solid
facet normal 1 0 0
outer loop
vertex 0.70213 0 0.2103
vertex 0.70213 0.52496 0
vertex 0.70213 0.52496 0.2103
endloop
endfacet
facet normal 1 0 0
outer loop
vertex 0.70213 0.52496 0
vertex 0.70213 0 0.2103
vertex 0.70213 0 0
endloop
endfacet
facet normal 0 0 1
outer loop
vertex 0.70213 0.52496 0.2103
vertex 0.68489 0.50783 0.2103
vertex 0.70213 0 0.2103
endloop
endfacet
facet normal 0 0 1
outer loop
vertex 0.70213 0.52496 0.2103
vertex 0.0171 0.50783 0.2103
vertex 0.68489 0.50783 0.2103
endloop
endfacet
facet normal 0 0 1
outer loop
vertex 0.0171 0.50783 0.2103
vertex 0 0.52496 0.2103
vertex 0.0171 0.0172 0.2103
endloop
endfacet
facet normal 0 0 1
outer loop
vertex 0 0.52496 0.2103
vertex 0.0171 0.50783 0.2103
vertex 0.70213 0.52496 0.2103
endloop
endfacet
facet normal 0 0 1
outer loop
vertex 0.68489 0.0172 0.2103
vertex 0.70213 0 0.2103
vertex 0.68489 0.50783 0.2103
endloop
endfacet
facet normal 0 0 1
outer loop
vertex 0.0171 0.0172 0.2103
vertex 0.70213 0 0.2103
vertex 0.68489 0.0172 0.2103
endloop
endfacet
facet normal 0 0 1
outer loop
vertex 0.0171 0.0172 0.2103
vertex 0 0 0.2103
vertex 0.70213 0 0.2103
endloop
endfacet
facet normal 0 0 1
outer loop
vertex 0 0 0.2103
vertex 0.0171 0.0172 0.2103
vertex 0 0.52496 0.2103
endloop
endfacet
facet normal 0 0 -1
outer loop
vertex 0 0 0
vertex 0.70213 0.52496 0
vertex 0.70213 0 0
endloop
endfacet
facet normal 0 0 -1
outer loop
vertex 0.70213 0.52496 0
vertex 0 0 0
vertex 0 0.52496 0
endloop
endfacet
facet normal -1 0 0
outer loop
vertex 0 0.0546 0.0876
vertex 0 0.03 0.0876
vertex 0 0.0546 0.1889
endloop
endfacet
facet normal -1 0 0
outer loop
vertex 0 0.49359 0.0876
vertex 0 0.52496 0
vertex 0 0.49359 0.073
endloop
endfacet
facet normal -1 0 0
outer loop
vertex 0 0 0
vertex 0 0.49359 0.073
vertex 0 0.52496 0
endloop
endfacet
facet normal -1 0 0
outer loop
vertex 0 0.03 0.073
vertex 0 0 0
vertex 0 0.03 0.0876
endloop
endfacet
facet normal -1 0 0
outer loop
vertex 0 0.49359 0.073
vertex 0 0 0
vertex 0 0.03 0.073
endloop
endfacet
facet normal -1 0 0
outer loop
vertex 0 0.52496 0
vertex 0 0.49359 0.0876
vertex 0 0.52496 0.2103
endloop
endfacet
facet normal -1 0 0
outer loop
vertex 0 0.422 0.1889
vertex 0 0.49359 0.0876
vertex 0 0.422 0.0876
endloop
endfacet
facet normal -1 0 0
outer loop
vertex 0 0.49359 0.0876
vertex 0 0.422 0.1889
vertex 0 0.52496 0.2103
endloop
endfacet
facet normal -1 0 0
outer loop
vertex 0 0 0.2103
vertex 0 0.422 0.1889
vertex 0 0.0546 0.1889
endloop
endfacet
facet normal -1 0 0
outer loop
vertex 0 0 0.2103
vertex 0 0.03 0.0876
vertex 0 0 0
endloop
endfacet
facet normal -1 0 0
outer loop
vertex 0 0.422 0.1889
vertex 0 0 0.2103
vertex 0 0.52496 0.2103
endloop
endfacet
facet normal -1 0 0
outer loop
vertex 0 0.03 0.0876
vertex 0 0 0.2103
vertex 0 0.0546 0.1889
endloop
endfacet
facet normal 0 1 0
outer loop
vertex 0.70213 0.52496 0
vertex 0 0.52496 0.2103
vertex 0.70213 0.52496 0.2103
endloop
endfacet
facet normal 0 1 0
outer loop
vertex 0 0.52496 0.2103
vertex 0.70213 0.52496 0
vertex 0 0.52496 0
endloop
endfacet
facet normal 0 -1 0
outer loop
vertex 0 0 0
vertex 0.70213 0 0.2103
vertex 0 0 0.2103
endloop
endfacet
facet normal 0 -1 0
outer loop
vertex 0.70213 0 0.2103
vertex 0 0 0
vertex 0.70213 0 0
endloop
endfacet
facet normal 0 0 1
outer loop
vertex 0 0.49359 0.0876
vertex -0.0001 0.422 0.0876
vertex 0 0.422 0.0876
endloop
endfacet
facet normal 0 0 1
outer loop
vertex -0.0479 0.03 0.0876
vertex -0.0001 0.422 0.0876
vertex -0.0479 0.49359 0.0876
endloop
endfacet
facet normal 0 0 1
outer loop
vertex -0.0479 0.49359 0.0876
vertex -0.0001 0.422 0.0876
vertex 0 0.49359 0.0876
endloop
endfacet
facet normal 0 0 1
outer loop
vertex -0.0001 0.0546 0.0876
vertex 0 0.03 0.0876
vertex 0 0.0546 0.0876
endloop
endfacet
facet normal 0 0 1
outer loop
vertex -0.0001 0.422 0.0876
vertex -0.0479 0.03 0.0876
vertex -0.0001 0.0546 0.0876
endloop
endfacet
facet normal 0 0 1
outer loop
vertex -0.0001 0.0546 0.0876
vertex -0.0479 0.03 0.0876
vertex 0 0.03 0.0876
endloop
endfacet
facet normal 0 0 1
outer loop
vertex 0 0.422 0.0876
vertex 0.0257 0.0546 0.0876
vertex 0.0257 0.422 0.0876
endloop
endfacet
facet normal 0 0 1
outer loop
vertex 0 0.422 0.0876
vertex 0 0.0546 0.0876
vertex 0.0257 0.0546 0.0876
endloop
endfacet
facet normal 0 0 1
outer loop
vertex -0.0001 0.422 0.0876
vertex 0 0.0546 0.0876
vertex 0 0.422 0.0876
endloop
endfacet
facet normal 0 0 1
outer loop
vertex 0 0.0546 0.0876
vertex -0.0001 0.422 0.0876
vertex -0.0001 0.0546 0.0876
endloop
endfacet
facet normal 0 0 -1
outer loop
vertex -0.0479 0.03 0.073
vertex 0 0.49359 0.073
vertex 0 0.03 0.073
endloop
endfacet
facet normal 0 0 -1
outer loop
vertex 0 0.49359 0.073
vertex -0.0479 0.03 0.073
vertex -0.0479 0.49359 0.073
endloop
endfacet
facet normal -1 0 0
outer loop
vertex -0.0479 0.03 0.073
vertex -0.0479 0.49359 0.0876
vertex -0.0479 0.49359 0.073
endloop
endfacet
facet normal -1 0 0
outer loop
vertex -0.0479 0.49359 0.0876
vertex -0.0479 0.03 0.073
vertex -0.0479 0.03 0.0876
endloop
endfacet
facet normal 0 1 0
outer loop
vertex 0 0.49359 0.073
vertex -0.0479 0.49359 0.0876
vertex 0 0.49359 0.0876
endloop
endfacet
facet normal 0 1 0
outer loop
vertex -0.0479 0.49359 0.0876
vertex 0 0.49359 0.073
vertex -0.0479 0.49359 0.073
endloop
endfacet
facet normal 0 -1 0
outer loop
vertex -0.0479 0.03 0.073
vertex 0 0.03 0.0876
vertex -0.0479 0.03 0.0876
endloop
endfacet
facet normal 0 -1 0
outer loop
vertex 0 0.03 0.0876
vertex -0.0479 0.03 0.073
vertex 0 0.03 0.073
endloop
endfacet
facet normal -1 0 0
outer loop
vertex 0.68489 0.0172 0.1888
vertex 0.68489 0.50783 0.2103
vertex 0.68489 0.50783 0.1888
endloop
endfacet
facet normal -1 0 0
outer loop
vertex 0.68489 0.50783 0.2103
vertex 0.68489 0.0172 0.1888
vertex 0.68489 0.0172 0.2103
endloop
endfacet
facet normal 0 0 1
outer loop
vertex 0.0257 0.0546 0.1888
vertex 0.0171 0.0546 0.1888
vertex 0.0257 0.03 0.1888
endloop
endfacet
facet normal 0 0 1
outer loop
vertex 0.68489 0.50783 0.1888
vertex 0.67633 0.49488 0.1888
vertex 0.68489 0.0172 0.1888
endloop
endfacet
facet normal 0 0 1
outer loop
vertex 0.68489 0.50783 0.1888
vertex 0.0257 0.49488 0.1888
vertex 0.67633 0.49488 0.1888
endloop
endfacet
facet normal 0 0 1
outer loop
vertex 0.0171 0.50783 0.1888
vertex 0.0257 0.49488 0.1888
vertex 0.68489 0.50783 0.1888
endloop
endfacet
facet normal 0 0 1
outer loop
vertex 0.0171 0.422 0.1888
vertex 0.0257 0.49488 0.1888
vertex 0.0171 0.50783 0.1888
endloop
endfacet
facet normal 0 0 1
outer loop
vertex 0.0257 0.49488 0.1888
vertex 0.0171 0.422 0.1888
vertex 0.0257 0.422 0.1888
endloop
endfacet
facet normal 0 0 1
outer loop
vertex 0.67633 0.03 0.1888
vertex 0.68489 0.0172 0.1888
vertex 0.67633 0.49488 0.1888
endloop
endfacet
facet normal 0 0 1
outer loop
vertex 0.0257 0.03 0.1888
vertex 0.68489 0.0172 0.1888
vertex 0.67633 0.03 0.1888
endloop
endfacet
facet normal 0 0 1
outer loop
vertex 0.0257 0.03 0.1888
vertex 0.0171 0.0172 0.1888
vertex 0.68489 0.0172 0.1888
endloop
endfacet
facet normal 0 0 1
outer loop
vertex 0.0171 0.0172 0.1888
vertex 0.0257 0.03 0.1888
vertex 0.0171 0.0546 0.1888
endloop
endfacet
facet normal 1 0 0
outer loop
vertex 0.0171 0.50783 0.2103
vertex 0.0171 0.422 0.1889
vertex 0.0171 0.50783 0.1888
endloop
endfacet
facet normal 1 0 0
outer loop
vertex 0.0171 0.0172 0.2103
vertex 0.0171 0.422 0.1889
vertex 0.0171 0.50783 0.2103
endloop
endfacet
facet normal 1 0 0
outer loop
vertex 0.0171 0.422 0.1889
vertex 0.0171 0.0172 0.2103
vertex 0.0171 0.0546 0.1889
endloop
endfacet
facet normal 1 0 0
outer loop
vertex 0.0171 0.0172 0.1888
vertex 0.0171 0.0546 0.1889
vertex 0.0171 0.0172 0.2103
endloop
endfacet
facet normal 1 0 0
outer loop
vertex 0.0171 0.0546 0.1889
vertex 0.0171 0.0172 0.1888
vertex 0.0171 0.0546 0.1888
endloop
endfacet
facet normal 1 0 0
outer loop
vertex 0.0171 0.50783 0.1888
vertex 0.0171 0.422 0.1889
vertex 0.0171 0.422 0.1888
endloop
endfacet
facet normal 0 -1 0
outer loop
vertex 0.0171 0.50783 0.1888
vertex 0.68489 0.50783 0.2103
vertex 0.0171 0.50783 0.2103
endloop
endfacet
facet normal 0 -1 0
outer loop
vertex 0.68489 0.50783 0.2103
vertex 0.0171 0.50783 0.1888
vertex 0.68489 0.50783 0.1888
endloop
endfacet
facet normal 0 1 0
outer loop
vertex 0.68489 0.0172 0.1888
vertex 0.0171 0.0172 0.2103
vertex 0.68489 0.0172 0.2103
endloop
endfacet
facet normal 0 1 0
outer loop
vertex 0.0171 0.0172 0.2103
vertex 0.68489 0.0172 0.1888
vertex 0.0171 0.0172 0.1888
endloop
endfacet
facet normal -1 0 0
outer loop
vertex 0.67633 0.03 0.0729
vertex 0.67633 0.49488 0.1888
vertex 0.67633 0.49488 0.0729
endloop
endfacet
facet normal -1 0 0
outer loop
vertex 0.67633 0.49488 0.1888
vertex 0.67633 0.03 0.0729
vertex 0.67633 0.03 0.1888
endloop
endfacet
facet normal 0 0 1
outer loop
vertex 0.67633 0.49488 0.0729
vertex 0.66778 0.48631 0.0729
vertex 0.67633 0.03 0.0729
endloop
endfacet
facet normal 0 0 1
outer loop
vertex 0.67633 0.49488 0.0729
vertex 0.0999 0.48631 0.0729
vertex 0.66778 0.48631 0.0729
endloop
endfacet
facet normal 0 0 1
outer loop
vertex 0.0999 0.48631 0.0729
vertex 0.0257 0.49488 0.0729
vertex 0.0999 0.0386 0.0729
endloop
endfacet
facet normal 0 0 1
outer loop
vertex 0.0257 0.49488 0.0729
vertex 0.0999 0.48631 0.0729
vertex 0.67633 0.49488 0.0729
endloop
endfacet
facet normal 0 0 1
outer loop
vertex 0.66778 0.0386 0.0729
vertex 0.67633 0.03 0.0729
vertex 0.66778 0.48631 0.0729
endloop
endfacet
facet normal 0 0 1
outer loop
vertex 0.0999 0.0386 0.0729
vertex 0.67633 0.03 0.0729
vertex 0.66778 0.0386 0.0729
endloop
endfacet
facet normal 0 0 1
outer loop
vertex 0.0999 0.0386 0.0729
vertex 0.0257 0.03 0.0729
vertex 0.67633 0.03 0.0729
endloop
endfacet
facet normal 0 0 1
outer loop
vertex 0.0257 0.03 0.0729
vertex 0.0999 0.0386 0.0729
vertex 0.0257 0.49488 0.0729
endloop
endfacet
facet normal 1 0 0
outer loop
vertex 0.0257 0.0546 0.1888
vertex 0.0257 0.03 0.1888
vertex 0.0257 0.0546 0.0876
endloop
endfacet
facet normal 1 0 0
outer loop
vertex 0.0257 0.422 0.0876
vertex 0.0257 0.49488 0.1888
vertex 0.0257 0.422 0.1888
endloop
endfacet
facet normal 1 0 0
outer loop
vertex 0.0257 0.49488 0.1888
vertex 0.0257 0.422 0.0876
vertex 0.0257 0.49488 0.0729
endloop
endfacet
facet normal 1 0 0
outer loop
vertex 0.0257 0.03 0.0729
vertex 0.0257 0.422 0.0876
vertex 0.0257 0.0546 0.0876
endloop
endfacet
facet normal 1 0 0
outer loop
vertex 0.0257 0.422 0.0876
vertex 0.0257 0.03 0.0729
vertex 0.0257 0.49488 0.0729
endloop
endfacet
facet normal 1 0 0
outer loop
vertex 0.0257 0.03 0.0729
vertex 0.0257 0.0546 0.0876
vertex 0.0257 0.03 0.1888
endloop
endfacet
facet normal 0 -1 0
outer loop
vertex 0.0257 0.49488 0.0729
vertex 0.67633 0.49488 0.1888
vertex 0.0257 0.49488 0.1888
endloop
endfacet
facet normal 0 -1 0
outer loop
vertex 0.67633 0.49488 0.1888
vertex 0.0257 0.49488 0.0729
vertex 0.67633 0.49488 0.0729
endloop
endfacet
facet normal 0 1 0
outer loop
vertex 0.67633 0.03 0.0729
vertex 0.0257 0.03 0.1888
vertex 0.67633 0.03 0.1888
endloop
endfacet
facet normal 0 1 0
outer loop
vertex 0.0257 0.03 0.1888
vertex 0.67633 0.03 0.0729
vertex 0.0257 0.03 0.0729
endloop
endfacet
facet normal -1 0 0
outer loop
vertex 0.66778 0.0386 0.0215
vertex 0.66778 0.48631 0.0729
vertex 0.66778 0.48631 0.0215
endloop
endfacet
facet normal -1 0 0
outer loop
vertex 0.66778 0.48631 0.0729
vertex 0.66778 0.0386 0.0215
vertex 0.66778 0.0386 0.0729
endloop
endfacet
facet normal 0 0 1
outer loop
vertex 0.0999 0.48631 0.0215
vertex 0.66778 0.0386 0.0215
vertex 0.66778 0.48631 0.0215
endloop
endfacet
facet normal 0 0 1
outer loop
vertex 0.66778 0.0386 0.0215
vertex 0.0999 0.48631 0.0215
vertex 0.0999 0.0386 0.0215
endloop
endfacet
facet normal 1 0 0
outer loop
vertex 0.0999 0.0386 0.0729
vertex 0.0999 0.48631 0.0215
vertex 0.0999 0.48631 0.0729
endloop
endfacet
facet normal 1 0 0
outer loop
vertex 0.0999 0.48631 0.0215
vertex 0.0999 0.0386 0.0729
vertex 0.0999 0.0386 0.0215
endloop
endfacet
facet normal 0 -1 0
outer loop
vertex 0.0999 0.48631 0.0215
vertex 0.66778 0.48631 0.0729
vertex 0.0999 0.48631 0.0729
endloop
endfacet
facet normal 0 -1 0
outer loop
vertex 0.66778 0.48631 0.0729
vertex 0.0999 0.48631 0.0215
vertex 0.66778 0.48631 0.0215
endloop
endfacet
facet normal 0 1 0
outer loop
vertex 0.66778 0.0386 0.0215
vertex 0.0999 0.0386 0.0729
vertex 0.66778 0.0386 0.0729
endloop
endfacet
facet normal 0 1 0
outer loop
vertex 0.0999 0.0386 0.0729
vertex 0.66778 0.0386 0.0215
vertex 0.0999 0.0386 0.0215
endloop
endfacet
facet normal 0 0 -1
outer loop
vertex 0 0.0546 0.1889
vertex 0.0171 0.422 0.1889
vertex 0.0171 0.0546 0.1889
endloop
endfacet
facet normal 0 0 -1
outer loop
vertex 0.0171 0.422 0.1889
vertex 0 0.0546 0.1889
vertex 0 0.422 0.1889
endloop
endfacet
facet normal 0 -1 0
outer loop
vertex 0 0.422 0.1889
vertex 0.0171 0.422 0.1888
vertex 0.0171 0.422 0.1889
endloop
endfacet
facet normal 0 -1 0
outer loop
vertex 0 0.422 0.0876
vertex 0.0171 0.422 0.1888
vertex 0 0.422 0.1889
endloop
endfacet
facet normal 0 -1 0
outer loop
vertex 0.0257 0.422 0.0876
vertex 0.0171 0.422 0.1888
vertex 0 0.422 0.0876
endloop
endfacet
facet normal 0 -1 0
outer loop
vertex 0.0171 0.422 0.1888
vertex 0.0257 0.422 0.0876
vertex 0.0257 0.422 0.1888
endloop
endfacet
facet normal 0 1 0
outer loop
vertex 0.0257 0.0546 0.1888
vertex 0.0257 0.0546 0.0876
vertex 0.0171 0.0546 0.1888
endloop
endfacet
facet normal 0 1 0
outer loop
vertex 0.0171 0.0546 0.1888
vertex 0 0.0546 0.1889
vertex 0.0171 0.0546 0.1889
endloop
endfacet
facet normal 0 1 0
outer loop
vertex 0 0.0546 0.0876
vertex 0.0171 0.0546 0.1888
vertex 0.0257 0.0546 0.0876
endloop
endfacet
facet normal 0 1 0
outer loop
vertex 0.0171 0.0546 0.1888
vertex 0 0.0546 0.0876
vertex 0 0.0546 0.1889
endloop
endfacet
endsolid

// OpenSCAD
// Parameters
$fn = 100;
eps = 0.0001;

// Main body
body_l = 0.702127;
body_w = 0.524964;
body_h = 0.2103;

// Top shallow recess
r1_x = 0.0171;
r1_y = 0.0172;
r1_w = 0.667793;
r1_d = 0.490631;
r1_z = 0.1888;
r1_h = body_h - r1_z; // 0.0215

// Continuation pocket downward
r2_x = 0.0257;
r2_y = 0.03;
r2_w = 0.650626;
r2_d = 0.46488;
r2_z = 0.0729;
r2_h = r1_z - r2_z; // 0.1159

// Lower contained pocket
r3_x = 0.0999;
r3_y = 0.0386;
r3_w = 0.567882;
r3_d = 0.447713;
r3_z = 0.0215;
r3_h = 0.073 - r3_z; // 0.0515

// Side projection
proj_over = 0.0479;
proj_w = 0.130618;
proj_d = 0.463588;
proj_y = 0.03;
proj_z = 0.073;
proj_h = 0.0146;

// Side recess at left edge
sr_depth = 0.0343;
sr_y = 0.0546;
sr_d = 0.3674;
sr_z = 0.0876;
sr_h = 0.1889 - sr_z; // 0.1013

// Base solid
module base_block() {
    cube([body_l, body_w, body_h]);
}

// Left side projection
module side_projection() {
    translate([-proj_over, proj_y, proj_z])
        cube([proj_w, proj_d, proj_h]);
}

// Top shallow recess cutter
module top_recess() {
    translate([r1_x, r1_y, r1_z])
        cube([r1_w, r1_d, r1_h + eps]);
}

// Continuation pocket cutter
module mid_pocket() {
    translate([r2_x, r2_y, r2_z])
        cube([r2_w, r2_d, r2_h]);
}

// Lower pocket cutter
module lower_pocket() {
    translate([r3_x, r3_y, r3_z])
        cube([r3_w, r3_d, r3_h]);
}

// Left side recess cutter
module side_recess() {
    translate([-eps, sr_y, sr_z])
        cube([sr_depth + eps, sr_d, sr_h]);
}

// Assembly
difference() {
    union() {
        base_block();
        side_projection();
    }
    top_recess();
    mid_pocket();
    lower_pocket();
    side_recess();
}
